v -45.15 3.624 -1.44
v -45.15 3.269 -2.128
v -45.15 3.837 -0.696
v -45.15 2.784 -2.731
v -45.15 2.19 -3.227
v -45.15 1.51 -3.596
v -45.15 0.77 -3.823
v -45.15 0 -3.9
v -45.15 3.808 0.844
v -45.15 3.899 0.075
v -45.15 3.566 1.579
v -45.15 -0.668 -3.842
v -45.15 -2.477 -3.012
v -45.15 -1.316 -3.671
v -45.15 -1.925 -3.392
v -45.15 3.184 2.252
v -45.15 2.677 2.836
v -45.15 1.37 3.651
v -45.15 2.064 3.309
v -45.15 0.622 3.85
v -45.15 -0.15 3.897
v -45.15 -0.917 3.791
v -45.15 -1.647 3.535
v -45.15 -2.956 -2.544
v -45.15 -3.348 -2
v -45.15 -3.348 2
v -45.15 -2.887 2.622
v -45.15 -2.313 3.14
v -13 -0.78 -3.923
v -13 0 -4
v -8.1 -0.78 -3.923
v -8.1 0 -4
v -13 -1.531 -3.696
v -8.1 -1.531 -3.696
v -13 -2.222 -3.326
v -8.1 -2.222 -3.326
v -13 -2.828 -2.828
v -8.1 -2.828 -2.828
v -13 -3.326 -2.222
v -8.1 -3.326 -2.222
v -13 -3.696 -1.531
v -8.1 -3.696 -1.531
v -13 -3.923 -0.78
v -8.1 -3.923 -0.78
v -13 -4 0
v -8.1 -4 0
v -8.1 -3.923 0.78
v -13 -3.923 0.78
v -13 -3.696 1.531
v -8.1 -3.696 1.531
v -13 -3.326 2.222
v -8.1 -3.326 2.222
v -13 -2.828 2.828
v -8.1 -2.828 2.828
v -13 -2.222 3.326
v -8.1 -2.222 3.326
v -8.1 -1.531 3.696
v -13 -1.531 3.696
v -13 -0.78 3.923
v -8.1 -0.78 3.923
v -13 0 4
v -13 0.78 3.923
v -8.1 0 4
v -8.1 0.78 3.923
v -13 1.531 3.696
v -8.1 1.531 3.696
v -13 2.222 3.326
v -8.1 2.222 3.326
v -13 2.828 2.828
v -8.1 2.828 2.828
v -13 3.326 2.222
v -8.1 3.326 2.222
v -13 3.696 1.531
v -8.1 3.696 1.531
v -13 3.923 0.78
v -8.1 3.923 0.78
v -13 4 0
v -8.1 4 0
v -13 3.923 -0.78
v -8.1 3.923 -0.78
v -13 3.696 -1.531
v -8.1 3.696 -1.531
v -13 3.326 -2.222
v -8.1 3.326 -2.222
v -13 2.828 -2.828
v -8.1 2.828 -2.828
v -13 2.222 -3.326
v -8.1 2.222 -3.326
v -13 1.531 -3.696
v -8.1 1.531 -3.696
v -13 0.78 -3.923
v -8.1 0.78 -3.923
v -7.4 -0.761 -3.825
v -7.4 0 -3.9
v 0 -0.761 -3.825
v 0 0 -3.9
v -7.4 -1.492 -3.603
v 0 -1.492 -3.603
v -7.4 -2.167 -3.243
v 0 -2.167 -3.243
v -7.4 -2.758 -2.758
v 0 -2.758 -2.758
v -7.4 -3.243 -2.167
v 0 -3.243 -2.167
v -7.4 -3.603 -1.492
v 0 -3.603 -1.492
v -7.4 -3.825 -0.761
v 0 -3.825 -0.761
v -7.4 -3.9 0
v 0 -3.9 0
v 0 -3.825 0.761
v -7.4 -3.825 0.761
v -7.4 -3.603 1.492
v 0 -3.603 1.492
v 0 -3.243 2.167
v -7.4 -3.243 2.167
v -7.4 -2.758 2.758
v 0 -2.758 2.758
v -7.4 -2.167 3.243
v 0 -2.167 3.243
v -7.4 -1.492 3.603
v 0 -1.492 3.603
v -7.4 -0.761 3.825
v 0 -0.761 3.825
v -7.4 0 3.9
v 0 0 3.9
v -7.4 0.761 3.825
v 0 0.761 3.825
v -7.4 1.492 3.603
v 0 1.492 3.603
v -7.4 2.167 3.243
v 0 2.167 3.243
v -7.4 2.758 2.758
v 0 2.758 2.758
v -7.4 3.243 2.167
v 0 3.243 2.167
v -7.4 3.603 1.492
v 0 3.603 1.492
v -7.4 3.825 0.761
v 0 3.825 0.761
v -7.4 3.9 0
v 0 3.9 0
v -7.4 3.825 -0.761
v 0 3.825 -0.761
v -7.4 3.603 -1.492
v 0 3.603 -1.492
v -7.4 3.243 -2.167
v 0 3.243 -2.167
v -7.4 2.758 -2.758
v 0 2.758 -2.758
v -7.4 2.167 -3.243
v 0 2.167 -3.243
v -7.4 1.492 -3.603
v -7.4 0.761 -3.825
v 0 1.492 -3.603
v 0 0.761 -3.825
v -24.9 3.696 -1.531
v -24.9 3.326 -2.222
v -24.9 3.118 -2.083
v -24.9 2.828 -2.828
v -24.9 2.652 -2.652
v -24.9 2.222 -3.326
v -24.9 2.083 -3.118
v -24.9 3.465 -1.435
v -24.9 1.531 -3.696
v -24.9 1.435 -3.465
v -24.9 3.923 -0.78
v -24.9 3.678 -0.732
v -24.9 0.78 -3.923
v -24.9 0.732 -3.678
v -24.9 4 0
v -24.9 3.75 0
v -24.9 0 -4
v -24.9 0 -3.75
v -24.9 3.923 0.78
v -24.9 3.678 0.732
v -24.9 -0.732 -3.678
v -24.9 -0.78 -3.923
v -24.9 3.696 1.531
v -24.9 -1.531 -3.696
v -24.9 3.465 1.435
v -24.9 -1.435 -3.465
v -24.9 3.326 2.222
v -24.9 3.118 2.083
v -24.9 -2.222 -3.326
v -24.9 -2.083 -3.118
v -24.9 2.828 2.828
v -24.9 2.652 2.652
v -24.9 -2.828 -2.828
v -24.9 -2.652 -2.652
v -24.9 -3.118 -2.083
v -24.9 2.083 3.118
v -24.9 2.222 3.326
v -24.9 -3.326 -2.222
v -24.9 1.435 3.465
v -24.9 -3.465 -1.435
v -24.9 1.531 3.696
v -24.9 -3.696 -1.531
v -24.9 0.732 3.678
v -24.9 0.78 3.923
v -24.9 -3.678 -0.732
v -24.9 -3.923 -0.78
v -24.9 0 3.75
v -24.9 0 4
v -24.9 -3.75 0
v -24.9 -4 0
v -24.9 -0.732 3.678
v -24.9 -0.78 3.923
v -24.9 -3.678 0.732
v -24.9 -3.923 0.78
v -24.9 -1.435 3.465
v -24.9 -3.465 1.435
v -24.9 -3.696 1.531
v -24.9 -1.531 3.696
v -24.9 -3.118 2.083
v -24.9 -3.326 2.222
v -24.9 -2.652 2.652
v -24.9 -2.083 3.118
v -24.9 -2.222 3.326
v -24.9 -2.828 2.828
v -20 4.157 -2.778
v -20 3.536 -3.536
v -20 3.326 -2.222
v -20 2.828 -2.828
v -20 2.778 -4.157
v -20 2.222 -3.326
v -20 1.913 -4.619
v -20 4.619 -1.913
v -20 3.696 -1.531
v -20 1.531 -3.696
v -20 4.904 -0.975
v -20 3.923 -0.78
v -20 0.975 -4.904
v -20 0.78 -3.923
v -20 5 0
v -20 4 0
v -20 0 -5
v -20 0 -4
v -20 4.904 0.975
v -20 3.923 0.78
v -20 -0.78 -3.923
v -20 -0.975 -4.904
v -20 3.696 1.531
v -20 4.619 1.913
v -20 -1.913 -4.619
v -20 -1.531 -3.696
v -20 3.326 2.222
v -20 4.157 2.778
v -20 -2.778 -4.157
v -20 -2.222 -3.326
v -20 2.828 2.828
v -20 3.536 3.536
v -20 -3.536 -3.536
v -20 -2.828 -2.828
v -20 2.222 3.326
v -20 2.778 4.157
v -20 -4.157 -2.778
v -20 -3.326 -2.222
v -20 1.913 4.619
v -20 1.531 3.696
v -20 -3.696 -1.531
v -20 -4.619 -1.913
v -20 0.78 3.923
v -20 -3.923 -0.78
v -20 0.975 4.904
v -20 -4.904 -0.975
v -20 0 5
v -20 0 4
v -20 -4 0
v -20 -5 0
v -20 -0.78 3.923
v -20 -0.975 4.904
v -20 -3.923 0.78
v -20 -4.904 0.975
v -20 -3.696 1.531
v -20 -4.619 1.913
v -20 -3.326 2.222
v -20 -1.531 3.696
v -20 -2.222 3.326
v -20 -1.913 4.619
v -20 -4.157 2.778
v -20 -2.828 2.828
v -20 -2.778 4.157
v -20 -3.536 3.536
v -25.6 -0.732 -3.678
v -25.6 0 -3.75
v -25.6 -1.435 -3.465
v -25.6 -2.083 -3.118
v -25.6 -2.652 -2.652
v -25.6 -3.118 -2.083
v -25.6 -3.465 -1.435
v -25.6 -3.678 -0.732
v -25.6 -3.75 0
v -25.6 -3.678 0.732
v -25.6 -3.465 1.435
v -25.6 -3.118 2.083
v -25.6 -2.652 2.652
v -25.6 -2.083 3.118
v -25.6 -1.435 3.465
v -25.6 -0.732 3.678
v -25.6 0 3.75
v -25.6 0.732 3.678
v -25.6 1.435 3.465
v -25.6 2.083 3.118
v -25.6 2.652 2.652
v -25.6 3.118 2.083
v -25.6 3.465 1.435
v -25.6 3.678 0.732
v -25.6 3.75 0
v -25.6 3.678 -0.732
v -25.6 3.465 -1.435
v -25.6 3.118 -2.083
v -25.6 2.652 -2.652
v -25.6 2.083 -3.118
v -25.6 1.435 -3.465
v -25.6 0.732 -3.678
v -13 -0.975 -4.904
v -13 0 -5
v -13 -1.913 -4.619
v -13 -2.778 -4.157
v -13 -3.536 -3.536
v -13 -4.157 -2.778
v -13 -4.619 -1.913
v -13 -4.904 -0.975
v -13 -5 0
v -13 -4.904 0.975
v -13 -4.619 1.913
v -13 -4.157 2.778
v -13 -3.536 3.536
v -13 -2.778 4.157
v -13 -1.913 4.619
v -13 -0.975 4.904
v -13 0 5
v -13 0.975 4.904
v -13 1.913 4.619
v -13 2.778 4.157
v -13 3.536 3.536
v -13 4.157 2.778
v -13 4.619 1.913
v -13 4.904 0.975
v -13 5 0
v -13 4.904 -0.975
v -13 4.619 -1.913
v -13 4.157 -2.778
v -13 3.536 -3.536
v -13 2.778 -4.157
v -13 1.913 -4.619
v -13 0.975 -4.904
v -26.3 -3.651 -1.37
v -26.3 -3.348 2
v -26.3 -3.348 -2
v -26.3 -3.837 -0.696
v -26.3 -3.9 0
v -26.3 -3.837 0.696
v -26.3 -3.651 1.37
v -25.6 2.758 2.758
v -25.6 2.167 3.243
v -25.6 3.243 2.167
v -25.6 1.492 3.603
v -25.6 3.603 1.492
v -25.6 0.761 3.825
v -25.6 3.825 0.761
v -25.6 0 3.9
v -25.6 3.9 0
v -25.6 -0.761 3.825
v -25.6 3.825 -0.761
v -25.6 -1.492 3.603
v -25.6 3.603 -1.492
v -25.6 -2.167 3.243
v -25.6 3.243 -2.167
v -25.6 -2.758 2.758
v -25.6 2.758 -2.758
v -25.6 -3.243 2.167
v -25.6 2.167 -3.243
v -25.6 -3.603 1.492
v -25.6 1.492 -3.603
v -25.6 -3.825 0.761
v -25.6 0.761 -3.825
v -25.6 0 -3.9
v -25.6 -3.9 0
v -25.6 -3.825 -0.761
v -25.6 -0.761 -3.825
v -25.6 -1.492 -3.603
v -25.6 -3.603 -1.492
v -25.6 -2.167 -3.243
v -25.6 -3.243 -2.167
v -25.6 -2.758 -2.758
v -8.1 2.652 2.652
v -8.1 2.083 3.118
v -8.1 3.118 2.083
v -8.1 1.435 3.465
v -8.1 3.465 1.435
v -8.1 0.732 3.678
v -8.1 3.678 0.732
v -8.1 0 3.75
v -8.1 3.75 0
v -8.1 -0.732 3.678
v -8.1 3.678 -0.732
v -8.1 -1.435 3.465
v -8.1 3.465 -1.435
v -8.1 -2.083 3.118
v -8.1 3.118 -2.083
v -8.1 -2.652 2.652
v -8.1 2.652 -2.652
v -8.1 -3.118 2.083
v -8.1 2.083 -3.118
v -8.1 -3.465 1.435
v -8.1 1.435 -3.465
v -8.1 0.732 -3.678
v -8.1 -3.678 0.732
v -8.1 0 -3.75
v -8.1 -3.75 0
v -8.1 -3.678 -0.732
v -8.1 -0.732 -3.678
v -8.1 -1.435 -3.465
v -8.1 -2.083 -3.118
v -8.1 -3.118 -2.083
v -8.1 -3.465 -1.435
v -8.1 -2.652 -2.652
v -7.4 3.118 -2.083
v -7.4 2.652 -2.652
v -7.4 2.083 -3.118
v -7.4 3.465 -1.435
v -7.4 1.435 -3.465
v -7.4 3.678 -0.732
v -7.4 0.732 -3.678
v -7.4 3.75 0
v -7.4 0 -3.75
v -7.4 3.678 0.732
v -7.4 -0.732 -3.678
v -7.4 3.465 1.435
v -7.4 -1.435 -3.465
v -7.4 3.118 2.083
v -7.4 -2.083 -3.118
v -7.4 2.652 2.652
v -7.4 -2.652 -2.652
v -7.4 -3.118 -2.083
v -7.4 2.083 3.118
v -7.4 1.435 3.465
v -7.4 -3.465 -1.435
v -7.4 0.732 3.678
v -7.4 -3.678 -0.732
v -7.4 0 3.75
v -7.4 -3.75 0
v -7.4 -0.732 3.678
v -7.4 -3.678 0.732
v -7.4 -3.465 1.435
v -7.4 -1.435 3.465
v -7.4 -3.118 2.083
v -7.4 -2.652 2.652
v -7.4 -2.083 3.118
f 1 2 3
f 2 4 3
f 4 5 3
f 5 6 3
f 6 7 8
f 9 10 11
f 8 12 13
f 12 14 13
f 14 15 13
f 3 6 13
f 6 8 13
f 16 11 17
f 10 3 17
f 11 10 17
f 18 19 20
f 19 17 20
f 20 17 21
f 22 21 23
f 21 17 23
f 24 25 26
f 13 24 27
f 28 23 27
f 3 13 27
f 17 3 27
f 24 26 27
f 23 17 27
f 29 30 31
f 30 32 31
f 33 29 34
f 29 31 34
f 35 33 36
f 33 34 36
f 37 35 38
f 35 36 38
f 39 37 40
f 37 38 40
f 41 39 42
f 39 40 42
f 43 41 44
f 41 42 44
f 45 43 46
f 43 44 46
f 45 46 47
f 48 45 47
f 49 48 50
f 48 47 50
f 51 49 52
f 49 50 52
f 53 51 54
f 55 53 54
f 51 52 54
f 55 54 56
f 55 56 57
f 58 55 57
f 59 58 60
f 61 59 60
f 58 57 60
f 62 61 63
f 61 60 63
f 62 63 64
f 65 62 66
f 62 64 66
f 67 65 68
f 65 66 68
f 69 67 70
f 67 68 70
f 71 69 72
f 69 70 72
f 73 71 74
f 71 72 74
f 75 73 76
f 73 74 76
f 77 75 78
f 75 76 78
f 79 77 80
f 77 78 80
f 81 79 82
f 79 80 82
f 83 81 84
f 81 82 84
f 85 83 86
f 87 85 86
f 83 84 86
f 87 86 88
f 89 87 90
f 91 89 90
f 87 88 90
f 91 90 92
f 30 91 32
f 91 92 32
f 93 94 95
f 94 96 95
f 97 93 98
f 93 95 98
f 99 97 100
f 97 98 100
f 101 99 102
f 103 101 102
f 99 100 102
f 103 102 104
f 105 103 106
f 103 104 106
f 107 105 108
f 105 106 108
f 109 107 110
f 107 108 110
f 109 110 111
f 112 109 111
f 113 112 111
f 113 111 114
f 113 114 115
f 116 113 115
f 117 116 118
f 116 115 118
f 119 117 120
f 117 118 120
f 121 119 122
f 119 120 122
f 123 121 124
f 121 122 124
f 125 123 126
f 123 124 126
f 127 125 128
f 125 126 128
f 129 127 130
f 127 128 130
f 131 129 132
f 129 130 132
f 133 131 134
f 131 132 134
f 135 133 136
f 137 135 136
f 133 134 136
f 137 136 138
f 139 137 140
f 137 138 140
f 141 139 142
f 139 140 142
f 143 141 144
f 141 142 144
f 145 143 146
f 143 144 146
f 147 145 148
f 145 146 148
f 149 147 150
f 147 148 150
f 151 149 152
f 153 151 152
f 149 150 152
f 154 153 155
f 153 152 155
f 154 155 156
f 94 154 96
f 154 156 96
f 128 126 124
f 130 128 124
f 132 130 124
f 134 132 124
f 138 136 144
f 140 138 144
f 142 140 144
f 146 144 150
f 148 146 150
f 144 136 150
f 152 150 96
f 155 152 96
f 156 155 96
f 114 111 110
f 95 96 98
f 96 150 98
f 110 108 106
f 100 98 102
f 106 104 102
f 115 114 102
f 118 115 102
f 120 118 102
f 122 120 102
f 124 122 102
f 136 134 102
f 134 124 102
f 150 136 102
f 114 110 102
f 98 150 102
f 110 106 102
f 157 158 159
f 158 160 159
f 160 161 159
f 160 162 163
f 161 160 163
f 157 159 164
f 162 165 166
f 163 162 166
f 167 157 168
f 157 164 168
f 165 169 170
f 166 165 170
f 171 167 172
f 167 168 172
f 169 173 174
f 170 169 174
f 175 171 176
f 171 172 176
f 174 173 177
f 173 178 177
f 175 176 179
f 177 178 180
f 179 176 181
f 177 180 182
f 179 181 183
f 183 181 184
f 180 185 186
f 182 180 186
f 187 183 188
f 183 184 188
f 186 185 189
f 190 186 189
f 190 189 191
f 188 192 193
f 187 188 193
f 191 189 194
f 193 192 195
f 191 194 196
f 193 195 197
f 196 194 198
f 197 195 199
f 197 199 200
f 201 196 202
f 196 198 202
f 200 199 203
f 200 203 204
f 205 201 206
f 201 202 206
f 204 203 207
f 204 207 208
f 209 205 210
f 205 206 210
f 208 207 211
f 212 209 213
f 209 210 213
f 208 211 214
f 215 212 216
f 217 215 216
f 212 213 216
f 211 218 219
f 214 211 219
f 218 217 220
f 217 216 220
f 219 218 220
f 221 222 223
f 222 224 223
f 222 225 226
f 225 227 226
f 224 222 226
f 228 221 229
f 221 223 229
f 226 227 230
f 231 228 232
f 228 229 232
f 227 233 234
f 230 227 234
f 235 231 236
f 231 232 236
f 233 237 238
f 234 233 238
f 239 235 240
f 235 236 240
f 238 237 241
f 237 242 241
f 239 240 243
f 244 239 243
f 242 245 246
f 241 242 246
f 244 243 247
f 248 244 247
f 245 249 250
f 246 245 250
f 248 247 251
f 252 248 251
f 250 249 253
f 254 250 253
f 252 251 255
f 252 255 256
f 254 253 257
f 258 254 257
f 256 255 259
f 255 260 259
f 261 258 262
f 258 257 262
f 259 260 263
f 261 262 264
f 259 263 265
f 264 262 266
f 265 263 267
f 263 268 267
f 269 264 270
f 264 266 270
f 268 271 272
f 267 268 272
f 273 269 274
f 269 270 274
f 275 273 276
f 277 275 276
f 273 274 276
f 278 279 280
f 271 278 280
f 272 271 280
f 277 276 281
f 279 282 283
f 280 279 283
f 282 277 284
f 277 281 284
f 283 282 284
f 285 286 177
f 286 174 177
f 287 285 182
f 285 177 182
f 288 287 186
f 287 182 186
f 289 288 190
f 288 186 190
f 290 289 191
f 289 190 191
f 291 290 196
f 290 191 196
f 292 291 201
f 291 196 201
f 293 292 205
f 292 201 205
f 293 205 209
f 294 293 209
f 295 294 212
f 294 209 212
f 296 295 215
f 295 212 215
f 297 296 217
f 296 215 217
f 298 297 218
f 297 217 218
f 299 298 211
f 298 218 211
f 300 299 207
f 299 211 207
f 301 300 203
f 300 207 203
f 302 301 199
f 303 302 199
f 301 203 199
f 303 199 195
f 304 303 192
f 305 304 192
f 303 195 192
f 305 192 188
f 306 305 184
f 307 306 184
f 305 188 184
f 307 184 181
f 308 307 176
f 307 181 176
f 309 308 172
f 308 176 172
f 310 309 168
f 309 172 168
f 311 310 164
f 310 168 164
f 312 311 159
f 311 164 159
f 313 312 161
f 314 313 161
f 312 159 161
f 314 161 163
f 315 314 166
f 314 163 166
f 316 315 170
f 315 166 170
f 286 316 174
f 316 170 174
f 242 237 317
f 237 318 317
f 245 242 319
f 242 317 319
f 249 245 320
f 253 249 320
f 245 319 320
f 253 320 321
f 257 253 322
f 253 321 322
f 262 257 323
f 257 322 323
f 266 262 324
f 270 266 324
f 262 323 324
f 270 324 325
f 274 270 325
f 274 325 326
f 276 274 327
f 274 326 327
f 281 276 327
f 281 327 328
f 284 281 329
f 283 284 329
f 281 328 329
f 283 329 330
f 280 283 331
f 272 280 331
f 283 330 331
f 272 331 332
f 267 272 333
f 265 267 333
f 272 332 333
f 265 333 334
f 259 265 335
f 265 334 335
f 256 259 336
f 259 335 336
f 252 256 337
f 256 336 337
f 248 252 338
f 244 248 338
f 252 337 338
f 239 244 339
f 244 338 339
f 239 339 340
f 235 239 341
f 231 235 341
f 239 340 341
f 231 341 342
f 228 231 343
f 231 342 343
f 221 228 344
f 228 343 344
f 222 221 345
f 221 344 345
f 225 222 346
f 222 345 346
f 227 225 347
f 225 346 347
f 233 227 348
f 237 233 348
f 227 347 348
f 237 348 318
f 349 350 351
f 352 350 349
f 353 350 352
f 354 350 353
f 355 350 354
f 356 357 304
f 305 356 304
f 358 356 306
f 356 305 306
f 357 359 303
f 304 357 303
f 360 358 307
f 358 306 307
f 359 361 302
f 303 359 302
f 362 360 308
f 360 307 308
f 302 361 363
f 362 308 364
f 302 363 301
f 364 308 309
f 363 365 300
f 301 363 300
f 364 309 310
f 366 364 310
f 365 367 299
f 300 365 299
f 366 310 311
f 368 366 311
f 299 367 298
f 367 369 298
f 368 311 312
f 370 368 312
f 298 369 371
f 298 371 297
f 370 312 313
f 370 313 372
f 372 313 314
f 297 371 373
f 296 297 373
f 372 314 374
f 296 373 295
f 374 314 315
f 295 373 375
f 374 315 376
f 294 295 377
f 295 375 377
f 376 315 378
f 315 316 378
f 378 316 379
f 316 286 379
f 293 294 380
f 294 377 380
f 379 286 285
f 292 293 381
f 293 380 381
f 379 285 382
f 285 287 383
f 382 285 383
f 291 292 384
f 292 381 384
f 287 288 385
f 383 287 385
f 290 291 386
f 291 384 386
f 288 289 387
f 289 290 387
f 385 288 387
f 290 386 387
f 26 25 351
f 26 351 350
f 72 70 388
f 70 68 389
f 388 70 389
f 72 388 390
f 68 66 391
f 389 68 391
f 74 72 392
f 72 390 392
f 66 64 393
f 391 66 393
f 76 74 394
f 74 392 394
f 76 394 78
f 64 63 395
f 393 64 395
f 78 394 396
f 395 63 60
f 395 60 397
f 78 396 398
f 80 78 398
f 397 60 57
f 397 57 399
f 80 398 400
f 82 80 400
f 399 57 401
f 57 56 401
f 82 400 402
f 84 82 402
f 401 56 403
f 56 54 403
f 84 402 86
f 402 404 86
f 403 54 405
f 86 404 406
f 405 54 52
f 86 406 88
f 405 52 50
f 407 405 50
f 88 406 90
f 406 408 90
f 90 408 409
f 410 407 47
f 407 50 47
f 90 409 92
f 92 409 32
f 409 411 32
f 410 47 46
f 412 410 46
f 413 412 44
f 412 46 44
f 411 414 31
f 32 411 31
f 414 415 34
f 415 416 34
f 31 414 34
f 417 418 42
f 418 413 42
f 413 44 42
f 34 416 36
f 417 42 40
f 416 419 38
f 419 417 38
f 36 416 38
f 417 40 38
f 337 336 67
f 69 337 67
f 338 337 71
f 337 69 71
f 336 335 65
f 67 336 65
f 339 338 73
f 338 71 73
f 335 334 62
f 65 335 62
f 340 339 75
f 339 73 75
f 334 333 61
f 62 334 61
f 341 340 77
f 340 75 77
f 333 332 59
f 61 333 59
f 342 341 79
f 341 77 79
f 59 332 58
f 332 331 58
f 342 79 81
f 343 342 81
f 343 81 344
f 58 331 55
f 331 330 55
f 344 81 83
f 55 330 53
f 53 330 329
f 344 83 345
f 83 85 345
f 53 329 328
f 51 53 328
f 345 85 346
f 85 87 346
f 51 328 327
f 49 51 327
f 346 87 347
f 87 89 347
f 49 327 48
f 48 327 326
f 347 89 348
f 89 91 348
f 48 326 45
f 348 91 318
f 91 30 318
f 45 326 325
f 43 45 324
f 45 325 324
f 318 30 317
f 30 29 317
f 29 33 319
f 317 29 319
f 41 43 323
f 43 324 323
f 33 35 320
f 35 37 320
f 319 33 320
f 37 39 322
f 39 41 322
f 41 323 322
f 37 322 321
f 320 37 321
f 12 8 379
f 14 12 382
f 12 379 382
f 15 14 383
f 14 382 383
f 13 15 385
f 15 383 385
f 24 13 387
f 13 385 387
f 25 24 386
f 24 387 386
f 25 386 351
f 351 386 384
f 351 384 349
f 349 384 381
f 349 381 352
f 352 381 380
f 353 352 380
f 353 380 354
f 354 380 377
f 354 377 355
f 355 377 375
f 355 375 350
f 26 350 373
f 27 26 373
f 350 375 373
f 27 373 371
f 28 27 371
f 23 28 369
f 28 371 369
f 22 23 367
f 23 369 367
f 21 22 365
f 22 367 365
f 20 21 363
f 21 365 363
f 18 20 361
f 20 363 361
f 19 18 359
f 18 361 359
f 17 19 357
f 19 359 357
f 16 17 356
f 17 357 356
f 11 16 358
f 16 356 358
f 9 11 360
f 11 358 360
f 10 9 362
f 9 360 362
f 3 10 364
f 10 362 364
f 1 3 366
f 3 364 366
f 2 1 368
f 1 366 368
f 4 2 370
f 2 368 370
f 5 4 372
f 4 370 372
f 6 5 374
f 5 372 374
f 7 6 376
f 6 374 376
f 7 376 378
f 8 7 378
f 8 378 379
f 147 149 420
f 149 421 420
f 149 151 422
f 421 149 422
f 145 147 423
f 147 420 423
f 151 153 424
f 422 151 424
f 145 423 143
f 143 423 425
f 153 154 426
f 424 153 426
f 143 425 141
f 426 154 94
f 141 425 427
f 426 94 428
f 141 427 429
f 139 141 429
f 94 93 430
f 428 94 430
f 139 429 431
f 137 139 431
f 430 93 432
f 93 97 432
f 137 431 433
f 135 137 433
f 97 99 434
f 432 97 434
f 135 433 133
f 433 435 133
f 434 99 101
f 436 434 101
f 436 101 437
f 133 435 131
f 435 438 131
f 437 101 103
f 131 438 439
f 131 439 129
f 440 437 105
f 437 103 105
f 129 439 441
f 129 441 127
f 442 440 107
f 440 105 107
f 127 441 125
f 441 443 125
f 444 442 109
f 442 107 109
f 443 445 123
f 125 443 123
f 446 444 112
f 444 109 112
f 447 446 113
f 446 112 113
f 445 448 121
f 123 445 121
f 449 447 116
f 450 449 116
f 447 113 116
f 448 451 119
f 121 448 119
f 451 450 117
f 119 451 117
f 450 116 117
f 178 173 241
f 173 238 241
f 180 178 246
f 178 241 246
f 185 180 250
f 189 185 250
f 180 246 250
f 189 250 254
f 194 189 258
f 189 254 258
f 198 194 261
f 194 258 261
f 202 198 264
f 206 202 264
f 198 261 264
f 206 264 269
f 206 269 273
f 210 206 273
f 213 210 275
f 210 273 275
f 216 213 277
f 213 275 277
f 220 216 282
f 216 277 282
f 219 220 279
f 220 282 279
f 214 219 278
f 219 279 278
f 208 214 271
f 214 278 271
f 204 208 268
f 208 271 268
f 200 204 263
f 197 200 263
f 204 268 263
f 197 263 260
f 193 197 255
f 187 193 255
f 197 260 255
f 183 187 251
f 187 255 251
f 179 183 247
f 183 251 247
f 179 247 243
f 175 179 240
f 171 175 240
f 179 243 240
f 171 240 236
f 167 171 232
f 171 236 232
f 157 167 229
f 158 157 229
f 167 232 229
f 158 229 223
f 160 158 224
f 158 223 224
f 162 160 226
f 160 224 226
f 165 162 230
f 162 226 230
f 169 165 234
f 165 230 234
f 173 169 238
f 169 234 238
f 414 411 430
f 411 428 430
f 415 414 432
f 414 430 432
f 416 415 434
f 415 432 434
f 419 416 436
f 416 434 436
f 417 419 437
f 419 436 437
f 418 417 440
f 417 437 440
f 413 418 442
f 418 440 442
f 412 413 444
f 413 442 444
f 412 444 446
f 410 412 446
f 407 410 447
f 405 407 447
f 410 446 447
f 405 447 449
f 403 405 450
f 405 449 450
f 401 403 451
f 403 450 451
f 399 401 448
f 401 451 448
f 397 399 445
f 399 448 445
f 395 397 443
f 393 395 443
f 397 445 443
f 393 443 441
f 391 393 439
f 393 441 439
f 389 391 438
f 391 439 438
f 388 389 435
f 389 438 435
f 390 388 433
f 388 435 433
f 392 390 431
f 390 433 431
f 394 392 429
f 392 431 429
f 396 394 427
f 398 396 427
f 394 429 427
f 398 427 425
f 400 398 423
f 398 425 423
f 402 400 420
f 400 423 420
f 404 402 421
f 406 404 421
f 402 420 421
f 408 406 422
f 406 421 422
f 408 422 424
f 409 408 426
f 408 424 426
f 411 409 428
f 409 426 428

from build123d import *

# Parameters (mm, degrees)
CUT_EXTRUDE2_START = -45.15
CUT_EXTRUDE2_DEPTH = 18.85


with BuildPart() as part:
    # Sketch1 → Revolve1 (revolve)
    with BuildSketch(Plane.XY, mode=Mode.PRIVATE) as revolve1_sk:
        Polygon((0, 0), (-45.15, 0), (-45.15, 3.9), (-25.6, 3.9), (-25.6, 3.75), (-24.9, 3.75), (-24.9, 4), (-20, 4), (-20, 5), (-13, 5), (-13, 4), (-8.1, 4), (-8.1, 3.75), (-7.4, 3.75), (-7.4, 3.9), (0, 3.9), align=None)
    revolve(revolve1_sk.sketch.rotate(Axis((0, 0, 0), (-1, 0, 0)), 90), axis=Axis((0, 0, 0), (-1, 0, 0)))

    # Sketch2 → Cut-Extrude2 (cut)
    with BuildSketch(Plane(origin=(0, 0, 0), x_dir=(0, 0, -1), z_dir=(1, 0, 0)).offset(CUT_EXTRUDE2_START)):
        with BuildLine():
            Line((2, -3.348133809), (-2, -3.348133809))
            ThreePointArc((-2, -3.348133809), (0, -3.9), (2, -3.348133809))
        make_face()
    extrude(amount=CUT_EXTRUDE2_DEPTH, mode=Mode.SUBTRACT)


solid = part.part
